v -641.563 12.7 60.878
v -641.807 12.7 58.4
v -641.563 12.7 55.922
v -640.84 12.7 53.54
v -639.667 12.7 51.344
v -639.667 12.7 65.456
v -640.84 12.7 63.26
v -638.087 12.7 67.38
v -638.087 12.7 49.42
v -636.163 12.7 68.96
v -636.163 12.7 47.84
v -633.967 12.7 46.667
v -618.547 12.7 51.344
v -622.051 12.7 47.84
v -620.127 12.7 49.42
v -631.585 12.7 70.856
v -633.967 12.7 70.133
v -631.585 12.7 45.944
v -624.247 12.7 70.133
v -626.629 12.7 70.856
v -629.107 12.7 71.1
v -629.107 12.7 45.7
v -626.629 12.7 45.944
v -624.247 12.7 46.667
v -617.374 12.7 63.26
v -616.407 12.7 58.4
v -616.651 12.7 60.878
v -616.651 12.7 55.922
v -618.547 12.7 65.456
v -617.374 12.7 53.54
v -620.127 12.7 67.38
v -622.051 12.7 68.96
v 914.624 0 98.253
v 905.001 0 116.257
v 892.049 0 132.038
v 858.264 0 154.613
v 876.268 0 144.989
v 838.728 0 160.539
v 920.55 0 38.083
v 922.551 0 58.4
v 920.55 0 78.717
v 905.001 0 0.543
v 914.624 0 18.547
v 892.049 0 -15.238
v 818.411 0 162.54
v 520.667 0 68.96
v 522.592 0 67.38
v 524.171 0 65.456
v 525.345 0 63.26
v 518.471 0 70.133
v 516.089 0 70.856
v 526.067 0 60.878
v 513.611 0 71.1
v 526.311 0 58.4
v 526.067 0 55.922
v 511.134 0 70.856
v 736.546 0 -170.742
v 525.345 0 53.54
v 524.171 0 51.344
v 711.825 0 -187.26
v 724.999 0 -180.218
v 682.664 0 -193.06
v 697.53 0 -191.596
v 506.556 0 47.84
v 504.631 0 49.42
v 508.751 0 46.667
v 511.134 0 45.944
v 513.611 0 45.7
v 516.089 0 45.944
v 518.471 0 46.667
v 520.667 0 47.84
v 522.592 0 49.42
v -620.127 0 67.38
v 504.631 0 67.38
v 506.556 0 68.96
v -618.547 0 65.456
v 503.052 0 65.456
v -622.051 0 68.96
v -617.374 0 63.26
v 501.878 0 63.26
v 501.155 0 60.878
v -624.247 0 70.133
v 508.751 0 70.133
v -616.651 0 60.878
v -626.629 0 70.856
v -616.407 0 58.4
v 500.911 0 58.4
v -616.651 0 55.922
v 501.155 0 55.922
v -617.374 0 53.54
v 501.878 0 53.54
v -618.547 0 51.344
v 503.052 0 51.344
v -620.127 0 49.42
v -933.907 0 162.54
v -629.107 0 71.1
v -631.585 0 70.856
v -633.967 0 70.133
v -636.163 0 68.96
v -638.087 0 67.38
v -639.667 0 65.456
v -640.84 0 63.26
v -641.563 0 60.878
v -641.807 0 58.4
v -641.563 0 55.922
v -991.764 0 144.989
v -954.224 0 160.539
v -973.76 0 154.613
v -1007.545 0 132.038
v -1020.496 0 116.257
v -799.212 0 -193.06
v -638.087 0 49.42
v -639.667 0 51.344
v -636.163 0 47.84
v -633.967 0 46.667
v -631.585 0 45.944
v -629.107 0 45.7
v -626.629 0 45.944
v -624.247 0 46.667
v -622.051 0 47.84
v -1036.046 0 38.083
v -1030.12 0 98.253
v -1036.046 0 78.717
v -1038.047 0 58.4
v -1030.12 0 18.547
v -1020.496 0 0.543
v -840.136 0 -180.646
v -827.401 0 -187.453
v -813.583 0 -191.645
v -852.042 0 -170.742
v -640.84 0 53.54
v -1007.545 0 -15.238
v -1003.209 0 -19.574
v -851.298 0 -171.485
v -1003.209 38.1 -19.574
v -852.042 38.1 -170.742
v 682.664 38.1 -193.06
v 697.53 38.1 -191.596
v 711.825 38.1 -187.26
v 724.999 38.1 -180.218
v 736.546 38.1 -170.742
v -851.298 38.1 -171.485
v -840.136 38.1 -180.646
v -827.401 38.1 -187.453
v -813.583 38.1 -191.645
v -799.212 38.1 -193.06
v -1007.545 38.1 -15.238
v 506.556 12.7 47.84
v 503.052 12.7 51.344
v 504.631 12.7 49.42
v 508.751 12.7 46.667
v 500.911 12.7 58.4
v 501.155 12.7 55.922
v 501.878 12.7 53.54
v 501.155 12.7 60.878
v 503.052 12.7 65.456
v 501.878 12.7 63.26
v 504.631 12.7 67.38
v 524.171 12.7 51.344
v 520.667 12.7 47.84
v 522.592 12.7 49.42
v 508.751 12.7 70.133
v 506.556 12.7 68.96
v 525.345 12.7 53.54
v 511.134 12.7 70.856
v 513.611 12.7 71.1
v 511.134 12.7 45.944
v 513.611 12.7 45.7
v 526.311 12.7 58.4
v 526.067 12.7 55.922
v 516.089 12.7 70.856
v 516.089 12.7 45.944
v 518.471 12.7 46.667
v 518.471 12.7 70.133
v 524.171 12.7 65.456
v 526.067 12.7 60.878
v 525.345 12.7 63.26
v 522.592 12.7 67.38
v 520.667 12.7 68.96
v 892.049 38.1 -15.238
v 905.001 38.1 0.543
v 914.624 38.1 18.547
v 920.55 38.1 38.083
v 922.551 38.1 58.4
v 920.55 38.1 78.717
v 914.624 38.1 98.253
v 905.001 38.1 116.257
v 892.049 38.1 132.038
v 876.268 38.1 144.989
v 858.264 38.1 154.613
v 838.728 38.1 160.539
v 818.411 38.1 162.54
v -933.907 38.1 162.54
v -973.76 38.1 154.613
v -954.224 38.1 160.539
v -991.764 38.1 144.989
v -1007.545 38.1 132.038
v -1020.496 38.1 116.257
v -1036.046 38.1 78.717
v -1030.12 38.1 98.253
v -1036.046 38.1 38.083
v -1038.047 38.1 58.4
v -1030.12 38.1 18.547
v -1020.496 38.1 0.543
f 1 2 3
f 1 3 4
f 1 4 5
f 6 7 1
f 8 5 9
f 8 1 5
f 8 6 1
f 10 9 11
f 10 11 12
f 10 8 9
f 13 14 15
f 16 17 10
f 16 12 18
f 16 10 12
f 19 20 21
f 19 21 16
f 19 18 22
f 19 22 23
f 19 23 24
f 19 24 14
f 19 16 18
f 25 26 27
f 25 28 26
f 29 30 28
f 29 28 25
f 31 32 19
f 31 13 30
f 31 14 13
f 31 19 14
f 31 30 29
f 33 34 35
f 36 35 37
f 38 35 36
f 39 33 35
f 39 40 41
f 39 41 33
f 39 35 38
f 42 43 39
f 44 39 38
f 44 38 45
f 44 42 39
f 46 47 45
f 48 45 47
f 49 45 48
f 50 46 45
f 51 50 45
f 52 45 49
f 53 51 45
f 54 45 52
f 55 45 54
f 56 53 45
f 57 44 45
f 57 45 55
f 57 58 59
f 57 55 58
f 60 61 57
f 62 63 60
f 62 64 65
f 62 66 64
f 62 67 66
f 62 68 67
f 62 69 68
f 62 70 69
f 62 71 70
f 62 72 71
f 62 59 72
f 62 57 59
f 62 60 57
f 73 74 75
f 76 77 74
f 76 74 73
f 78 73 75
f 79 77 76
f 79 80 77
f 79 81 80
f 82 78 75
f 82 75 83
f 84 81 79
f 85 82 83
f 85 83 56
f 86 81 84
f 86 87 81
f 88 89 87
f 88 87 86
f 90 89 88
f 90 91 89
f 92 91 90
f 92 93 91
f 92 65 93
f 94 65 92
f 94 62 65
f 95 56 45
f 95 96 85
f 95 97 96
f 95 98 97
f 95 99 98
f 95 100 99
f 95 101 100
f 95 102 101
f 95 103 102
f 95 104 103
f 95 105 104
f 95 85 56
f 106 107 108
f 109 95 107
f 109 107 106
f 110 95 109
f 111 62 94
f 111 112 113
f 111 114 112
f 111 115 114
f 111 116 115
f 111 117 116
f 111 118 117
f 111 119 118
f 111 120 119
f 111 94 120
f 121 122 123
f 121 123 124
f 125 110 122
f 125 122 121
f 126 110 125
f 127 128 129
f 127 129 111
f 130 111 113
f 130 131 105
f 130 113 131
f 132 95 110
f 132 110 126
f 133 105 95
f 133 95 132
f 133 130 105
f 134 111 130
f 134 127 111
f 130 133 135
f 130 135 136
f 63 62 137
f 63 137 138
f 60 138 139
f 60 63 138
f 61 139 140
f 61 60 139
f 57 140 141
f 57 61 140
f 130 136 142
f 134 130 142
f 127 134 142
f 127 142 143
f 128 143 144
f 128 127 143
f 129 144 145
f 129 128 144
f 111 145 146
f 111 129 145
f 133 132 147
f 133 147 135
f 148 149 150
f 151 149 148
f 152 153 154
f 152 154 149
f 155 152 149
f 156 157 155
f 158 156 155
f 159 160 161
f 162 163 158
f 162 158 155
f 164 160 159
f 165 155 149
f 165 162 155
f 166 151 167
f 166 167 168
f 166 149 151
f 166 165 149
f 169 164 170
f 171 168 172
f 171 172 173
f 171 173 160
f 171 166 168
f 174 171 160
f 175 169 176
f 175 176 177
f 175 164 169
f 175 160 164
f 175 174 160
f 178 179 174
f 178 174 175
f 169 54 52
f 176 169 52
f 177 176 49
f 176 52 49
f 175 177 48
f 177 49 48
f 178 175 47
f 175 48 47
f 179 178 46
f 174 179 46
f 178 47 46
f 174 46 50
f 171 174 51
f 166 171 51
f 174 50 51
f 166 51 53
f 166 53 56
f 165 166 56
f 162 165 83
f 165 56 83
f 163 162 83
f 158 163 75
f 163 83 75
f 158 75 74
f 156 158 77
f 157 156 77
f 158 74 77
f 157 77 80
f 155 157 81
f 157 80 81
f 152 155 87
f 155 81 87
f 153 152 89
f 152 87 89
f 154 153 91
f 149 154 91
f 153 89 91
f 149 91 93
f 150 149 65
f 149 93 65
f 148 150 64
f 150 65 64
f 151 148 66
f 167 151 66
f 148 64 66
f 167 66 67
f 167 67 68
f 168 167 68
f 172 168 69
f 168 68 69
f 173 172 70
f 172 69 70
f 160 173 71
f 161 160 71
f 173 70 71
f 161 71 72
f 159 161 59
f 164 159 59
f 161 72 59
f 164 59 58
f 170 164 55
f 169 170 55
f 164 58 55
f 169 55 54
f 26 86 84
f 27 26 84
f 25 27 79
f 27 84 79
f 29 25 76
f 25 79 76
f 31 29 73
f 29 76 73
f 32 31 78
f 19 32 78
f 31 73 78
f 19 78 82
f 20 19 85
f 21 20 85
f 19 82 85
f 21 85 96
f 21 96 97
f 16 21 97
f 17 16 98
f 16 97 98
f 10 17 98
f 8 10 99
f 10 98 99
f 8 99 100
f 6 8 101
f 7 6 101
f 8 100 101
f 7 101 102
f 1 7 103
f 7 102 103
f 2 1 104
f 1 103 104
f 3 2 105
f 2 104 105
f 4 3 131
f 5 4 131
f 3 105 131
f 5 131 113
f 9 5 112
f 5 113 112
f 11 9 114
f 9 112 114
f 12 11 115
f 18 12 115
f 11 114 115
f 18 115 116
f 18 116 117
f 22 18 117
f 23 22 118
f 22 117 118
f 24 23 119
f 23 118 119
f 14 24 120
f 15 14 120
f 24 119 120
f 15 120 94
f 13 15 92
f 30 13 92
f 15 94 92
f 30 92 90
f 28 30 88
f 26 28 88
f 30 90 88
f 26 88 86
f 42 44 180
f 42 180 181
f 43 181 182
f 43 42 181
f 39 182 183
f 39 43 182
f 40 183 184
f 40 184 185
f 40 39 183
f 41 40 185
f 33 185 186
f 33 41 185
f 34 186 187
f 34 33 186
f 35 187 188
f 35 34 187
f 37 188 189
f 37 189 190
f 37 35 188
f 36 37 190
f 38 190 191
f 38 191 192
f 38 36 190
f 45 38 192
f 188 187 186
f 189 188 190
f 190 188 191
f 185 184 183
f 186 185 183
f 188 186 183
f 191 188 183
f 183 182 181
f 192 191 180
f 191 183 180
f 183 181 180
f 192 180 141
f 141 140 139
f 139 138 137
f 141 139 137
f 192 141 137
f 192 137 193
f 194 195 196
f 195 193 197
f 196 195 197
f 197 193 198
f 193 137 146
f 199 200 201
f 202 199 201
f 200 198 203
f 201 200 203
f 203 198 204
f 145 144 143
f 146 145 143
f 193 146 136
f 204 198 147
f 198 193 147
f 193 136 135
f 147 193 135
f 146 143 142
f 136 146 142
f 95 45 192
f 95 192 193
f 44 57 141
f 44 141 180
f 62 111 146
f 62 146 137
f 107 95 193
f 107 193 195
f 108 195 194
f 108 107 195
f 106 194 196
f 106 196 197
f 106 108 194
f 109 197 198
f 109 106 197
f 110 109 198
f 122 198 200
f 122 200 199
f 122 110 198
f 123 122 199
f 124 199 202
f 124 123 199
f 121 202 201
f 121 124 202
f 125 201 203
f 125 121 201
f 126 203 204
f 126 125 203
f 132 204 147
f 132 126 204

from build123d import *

# Parameters (mm, degrees)
BOSS_EXTRUDE1_DEPTH = 38.1
SKETCH2_R           = 12.7
CUT_EXTRUDE1_DEPTH  = 12.7


with BuildPart() as part:
    # Sketch1 → Boss-Extrude1 (new body)
    with BuildSketch(Plane(origin=(0, 0, 0), x_dir=(1, 0, 0), z_dir=(0, 1, 0))):
        with BuildLine():
            Line((-1003.209151546, 19.574124673), (-852.041766236, 170.741509982))
            Line((-852.041766236, 170.741509982), (-851.297817461, 171.485458758))
            ThreePointArc((-851.297817461, 171.485458758), (-827.400793586, 187.45293962), (-799.212331958, 193.059973256))
            Line((-799.212331958, 193.059973256), (-752.46588673, 193.059973256))
            Line((-752.46588673, 193.059973256), (636.970077719, 193.059973256))
            Line((636.970077719, 193.059973256), (682.664420499, 193.059973256))
            ThreePointArc((682.664420499, 193.059973256), (711.824898045, 187.259593633), (736.545957225, 170.741509982))
            Line((736.545957225, 170.741509982), (892.049393759, 15.238073448))
            ThreePointArc((892.049393759, 15.238073448), (914.624108082, -98.252679391), (818.411293566, -162.540026744))
            Line((818.411293566, -162.540026744), (812.279191118, -162.540026744))
            Line((812.279191118, -162.540026744), (-927.775000129, -162.540026744))
            Line((-927.775000129, -162.540026744), (-933.907102577, -162.540026744))
            ThreePointArc((-933.907102577, -162.540026744), (-1030.119917093, -98.252679391), (-1007.54520277, 15.238073448))
            Line((-1007.54520277, 15.238073448), (-1003.209151546, 19.574124673))
        make_face()
    extrude(amount=BOSS_EXTRUDE1_DEPTH)

    # Sketch2 → Cut-Extrude1 (cut)
    with BuildSketch(Plane.XZ):
        with Locations((-629.107102577, 58.400026744)):
            Circle(SKETCH2_R)
        with Locations((513.611293566, 58.400026744)):
            Circle(SKETCH2_R)
    extrude(amount=-CUT_EXTRUDE1_DEPTH, mode=Mode.SUBTRACT)


solid = part.part
